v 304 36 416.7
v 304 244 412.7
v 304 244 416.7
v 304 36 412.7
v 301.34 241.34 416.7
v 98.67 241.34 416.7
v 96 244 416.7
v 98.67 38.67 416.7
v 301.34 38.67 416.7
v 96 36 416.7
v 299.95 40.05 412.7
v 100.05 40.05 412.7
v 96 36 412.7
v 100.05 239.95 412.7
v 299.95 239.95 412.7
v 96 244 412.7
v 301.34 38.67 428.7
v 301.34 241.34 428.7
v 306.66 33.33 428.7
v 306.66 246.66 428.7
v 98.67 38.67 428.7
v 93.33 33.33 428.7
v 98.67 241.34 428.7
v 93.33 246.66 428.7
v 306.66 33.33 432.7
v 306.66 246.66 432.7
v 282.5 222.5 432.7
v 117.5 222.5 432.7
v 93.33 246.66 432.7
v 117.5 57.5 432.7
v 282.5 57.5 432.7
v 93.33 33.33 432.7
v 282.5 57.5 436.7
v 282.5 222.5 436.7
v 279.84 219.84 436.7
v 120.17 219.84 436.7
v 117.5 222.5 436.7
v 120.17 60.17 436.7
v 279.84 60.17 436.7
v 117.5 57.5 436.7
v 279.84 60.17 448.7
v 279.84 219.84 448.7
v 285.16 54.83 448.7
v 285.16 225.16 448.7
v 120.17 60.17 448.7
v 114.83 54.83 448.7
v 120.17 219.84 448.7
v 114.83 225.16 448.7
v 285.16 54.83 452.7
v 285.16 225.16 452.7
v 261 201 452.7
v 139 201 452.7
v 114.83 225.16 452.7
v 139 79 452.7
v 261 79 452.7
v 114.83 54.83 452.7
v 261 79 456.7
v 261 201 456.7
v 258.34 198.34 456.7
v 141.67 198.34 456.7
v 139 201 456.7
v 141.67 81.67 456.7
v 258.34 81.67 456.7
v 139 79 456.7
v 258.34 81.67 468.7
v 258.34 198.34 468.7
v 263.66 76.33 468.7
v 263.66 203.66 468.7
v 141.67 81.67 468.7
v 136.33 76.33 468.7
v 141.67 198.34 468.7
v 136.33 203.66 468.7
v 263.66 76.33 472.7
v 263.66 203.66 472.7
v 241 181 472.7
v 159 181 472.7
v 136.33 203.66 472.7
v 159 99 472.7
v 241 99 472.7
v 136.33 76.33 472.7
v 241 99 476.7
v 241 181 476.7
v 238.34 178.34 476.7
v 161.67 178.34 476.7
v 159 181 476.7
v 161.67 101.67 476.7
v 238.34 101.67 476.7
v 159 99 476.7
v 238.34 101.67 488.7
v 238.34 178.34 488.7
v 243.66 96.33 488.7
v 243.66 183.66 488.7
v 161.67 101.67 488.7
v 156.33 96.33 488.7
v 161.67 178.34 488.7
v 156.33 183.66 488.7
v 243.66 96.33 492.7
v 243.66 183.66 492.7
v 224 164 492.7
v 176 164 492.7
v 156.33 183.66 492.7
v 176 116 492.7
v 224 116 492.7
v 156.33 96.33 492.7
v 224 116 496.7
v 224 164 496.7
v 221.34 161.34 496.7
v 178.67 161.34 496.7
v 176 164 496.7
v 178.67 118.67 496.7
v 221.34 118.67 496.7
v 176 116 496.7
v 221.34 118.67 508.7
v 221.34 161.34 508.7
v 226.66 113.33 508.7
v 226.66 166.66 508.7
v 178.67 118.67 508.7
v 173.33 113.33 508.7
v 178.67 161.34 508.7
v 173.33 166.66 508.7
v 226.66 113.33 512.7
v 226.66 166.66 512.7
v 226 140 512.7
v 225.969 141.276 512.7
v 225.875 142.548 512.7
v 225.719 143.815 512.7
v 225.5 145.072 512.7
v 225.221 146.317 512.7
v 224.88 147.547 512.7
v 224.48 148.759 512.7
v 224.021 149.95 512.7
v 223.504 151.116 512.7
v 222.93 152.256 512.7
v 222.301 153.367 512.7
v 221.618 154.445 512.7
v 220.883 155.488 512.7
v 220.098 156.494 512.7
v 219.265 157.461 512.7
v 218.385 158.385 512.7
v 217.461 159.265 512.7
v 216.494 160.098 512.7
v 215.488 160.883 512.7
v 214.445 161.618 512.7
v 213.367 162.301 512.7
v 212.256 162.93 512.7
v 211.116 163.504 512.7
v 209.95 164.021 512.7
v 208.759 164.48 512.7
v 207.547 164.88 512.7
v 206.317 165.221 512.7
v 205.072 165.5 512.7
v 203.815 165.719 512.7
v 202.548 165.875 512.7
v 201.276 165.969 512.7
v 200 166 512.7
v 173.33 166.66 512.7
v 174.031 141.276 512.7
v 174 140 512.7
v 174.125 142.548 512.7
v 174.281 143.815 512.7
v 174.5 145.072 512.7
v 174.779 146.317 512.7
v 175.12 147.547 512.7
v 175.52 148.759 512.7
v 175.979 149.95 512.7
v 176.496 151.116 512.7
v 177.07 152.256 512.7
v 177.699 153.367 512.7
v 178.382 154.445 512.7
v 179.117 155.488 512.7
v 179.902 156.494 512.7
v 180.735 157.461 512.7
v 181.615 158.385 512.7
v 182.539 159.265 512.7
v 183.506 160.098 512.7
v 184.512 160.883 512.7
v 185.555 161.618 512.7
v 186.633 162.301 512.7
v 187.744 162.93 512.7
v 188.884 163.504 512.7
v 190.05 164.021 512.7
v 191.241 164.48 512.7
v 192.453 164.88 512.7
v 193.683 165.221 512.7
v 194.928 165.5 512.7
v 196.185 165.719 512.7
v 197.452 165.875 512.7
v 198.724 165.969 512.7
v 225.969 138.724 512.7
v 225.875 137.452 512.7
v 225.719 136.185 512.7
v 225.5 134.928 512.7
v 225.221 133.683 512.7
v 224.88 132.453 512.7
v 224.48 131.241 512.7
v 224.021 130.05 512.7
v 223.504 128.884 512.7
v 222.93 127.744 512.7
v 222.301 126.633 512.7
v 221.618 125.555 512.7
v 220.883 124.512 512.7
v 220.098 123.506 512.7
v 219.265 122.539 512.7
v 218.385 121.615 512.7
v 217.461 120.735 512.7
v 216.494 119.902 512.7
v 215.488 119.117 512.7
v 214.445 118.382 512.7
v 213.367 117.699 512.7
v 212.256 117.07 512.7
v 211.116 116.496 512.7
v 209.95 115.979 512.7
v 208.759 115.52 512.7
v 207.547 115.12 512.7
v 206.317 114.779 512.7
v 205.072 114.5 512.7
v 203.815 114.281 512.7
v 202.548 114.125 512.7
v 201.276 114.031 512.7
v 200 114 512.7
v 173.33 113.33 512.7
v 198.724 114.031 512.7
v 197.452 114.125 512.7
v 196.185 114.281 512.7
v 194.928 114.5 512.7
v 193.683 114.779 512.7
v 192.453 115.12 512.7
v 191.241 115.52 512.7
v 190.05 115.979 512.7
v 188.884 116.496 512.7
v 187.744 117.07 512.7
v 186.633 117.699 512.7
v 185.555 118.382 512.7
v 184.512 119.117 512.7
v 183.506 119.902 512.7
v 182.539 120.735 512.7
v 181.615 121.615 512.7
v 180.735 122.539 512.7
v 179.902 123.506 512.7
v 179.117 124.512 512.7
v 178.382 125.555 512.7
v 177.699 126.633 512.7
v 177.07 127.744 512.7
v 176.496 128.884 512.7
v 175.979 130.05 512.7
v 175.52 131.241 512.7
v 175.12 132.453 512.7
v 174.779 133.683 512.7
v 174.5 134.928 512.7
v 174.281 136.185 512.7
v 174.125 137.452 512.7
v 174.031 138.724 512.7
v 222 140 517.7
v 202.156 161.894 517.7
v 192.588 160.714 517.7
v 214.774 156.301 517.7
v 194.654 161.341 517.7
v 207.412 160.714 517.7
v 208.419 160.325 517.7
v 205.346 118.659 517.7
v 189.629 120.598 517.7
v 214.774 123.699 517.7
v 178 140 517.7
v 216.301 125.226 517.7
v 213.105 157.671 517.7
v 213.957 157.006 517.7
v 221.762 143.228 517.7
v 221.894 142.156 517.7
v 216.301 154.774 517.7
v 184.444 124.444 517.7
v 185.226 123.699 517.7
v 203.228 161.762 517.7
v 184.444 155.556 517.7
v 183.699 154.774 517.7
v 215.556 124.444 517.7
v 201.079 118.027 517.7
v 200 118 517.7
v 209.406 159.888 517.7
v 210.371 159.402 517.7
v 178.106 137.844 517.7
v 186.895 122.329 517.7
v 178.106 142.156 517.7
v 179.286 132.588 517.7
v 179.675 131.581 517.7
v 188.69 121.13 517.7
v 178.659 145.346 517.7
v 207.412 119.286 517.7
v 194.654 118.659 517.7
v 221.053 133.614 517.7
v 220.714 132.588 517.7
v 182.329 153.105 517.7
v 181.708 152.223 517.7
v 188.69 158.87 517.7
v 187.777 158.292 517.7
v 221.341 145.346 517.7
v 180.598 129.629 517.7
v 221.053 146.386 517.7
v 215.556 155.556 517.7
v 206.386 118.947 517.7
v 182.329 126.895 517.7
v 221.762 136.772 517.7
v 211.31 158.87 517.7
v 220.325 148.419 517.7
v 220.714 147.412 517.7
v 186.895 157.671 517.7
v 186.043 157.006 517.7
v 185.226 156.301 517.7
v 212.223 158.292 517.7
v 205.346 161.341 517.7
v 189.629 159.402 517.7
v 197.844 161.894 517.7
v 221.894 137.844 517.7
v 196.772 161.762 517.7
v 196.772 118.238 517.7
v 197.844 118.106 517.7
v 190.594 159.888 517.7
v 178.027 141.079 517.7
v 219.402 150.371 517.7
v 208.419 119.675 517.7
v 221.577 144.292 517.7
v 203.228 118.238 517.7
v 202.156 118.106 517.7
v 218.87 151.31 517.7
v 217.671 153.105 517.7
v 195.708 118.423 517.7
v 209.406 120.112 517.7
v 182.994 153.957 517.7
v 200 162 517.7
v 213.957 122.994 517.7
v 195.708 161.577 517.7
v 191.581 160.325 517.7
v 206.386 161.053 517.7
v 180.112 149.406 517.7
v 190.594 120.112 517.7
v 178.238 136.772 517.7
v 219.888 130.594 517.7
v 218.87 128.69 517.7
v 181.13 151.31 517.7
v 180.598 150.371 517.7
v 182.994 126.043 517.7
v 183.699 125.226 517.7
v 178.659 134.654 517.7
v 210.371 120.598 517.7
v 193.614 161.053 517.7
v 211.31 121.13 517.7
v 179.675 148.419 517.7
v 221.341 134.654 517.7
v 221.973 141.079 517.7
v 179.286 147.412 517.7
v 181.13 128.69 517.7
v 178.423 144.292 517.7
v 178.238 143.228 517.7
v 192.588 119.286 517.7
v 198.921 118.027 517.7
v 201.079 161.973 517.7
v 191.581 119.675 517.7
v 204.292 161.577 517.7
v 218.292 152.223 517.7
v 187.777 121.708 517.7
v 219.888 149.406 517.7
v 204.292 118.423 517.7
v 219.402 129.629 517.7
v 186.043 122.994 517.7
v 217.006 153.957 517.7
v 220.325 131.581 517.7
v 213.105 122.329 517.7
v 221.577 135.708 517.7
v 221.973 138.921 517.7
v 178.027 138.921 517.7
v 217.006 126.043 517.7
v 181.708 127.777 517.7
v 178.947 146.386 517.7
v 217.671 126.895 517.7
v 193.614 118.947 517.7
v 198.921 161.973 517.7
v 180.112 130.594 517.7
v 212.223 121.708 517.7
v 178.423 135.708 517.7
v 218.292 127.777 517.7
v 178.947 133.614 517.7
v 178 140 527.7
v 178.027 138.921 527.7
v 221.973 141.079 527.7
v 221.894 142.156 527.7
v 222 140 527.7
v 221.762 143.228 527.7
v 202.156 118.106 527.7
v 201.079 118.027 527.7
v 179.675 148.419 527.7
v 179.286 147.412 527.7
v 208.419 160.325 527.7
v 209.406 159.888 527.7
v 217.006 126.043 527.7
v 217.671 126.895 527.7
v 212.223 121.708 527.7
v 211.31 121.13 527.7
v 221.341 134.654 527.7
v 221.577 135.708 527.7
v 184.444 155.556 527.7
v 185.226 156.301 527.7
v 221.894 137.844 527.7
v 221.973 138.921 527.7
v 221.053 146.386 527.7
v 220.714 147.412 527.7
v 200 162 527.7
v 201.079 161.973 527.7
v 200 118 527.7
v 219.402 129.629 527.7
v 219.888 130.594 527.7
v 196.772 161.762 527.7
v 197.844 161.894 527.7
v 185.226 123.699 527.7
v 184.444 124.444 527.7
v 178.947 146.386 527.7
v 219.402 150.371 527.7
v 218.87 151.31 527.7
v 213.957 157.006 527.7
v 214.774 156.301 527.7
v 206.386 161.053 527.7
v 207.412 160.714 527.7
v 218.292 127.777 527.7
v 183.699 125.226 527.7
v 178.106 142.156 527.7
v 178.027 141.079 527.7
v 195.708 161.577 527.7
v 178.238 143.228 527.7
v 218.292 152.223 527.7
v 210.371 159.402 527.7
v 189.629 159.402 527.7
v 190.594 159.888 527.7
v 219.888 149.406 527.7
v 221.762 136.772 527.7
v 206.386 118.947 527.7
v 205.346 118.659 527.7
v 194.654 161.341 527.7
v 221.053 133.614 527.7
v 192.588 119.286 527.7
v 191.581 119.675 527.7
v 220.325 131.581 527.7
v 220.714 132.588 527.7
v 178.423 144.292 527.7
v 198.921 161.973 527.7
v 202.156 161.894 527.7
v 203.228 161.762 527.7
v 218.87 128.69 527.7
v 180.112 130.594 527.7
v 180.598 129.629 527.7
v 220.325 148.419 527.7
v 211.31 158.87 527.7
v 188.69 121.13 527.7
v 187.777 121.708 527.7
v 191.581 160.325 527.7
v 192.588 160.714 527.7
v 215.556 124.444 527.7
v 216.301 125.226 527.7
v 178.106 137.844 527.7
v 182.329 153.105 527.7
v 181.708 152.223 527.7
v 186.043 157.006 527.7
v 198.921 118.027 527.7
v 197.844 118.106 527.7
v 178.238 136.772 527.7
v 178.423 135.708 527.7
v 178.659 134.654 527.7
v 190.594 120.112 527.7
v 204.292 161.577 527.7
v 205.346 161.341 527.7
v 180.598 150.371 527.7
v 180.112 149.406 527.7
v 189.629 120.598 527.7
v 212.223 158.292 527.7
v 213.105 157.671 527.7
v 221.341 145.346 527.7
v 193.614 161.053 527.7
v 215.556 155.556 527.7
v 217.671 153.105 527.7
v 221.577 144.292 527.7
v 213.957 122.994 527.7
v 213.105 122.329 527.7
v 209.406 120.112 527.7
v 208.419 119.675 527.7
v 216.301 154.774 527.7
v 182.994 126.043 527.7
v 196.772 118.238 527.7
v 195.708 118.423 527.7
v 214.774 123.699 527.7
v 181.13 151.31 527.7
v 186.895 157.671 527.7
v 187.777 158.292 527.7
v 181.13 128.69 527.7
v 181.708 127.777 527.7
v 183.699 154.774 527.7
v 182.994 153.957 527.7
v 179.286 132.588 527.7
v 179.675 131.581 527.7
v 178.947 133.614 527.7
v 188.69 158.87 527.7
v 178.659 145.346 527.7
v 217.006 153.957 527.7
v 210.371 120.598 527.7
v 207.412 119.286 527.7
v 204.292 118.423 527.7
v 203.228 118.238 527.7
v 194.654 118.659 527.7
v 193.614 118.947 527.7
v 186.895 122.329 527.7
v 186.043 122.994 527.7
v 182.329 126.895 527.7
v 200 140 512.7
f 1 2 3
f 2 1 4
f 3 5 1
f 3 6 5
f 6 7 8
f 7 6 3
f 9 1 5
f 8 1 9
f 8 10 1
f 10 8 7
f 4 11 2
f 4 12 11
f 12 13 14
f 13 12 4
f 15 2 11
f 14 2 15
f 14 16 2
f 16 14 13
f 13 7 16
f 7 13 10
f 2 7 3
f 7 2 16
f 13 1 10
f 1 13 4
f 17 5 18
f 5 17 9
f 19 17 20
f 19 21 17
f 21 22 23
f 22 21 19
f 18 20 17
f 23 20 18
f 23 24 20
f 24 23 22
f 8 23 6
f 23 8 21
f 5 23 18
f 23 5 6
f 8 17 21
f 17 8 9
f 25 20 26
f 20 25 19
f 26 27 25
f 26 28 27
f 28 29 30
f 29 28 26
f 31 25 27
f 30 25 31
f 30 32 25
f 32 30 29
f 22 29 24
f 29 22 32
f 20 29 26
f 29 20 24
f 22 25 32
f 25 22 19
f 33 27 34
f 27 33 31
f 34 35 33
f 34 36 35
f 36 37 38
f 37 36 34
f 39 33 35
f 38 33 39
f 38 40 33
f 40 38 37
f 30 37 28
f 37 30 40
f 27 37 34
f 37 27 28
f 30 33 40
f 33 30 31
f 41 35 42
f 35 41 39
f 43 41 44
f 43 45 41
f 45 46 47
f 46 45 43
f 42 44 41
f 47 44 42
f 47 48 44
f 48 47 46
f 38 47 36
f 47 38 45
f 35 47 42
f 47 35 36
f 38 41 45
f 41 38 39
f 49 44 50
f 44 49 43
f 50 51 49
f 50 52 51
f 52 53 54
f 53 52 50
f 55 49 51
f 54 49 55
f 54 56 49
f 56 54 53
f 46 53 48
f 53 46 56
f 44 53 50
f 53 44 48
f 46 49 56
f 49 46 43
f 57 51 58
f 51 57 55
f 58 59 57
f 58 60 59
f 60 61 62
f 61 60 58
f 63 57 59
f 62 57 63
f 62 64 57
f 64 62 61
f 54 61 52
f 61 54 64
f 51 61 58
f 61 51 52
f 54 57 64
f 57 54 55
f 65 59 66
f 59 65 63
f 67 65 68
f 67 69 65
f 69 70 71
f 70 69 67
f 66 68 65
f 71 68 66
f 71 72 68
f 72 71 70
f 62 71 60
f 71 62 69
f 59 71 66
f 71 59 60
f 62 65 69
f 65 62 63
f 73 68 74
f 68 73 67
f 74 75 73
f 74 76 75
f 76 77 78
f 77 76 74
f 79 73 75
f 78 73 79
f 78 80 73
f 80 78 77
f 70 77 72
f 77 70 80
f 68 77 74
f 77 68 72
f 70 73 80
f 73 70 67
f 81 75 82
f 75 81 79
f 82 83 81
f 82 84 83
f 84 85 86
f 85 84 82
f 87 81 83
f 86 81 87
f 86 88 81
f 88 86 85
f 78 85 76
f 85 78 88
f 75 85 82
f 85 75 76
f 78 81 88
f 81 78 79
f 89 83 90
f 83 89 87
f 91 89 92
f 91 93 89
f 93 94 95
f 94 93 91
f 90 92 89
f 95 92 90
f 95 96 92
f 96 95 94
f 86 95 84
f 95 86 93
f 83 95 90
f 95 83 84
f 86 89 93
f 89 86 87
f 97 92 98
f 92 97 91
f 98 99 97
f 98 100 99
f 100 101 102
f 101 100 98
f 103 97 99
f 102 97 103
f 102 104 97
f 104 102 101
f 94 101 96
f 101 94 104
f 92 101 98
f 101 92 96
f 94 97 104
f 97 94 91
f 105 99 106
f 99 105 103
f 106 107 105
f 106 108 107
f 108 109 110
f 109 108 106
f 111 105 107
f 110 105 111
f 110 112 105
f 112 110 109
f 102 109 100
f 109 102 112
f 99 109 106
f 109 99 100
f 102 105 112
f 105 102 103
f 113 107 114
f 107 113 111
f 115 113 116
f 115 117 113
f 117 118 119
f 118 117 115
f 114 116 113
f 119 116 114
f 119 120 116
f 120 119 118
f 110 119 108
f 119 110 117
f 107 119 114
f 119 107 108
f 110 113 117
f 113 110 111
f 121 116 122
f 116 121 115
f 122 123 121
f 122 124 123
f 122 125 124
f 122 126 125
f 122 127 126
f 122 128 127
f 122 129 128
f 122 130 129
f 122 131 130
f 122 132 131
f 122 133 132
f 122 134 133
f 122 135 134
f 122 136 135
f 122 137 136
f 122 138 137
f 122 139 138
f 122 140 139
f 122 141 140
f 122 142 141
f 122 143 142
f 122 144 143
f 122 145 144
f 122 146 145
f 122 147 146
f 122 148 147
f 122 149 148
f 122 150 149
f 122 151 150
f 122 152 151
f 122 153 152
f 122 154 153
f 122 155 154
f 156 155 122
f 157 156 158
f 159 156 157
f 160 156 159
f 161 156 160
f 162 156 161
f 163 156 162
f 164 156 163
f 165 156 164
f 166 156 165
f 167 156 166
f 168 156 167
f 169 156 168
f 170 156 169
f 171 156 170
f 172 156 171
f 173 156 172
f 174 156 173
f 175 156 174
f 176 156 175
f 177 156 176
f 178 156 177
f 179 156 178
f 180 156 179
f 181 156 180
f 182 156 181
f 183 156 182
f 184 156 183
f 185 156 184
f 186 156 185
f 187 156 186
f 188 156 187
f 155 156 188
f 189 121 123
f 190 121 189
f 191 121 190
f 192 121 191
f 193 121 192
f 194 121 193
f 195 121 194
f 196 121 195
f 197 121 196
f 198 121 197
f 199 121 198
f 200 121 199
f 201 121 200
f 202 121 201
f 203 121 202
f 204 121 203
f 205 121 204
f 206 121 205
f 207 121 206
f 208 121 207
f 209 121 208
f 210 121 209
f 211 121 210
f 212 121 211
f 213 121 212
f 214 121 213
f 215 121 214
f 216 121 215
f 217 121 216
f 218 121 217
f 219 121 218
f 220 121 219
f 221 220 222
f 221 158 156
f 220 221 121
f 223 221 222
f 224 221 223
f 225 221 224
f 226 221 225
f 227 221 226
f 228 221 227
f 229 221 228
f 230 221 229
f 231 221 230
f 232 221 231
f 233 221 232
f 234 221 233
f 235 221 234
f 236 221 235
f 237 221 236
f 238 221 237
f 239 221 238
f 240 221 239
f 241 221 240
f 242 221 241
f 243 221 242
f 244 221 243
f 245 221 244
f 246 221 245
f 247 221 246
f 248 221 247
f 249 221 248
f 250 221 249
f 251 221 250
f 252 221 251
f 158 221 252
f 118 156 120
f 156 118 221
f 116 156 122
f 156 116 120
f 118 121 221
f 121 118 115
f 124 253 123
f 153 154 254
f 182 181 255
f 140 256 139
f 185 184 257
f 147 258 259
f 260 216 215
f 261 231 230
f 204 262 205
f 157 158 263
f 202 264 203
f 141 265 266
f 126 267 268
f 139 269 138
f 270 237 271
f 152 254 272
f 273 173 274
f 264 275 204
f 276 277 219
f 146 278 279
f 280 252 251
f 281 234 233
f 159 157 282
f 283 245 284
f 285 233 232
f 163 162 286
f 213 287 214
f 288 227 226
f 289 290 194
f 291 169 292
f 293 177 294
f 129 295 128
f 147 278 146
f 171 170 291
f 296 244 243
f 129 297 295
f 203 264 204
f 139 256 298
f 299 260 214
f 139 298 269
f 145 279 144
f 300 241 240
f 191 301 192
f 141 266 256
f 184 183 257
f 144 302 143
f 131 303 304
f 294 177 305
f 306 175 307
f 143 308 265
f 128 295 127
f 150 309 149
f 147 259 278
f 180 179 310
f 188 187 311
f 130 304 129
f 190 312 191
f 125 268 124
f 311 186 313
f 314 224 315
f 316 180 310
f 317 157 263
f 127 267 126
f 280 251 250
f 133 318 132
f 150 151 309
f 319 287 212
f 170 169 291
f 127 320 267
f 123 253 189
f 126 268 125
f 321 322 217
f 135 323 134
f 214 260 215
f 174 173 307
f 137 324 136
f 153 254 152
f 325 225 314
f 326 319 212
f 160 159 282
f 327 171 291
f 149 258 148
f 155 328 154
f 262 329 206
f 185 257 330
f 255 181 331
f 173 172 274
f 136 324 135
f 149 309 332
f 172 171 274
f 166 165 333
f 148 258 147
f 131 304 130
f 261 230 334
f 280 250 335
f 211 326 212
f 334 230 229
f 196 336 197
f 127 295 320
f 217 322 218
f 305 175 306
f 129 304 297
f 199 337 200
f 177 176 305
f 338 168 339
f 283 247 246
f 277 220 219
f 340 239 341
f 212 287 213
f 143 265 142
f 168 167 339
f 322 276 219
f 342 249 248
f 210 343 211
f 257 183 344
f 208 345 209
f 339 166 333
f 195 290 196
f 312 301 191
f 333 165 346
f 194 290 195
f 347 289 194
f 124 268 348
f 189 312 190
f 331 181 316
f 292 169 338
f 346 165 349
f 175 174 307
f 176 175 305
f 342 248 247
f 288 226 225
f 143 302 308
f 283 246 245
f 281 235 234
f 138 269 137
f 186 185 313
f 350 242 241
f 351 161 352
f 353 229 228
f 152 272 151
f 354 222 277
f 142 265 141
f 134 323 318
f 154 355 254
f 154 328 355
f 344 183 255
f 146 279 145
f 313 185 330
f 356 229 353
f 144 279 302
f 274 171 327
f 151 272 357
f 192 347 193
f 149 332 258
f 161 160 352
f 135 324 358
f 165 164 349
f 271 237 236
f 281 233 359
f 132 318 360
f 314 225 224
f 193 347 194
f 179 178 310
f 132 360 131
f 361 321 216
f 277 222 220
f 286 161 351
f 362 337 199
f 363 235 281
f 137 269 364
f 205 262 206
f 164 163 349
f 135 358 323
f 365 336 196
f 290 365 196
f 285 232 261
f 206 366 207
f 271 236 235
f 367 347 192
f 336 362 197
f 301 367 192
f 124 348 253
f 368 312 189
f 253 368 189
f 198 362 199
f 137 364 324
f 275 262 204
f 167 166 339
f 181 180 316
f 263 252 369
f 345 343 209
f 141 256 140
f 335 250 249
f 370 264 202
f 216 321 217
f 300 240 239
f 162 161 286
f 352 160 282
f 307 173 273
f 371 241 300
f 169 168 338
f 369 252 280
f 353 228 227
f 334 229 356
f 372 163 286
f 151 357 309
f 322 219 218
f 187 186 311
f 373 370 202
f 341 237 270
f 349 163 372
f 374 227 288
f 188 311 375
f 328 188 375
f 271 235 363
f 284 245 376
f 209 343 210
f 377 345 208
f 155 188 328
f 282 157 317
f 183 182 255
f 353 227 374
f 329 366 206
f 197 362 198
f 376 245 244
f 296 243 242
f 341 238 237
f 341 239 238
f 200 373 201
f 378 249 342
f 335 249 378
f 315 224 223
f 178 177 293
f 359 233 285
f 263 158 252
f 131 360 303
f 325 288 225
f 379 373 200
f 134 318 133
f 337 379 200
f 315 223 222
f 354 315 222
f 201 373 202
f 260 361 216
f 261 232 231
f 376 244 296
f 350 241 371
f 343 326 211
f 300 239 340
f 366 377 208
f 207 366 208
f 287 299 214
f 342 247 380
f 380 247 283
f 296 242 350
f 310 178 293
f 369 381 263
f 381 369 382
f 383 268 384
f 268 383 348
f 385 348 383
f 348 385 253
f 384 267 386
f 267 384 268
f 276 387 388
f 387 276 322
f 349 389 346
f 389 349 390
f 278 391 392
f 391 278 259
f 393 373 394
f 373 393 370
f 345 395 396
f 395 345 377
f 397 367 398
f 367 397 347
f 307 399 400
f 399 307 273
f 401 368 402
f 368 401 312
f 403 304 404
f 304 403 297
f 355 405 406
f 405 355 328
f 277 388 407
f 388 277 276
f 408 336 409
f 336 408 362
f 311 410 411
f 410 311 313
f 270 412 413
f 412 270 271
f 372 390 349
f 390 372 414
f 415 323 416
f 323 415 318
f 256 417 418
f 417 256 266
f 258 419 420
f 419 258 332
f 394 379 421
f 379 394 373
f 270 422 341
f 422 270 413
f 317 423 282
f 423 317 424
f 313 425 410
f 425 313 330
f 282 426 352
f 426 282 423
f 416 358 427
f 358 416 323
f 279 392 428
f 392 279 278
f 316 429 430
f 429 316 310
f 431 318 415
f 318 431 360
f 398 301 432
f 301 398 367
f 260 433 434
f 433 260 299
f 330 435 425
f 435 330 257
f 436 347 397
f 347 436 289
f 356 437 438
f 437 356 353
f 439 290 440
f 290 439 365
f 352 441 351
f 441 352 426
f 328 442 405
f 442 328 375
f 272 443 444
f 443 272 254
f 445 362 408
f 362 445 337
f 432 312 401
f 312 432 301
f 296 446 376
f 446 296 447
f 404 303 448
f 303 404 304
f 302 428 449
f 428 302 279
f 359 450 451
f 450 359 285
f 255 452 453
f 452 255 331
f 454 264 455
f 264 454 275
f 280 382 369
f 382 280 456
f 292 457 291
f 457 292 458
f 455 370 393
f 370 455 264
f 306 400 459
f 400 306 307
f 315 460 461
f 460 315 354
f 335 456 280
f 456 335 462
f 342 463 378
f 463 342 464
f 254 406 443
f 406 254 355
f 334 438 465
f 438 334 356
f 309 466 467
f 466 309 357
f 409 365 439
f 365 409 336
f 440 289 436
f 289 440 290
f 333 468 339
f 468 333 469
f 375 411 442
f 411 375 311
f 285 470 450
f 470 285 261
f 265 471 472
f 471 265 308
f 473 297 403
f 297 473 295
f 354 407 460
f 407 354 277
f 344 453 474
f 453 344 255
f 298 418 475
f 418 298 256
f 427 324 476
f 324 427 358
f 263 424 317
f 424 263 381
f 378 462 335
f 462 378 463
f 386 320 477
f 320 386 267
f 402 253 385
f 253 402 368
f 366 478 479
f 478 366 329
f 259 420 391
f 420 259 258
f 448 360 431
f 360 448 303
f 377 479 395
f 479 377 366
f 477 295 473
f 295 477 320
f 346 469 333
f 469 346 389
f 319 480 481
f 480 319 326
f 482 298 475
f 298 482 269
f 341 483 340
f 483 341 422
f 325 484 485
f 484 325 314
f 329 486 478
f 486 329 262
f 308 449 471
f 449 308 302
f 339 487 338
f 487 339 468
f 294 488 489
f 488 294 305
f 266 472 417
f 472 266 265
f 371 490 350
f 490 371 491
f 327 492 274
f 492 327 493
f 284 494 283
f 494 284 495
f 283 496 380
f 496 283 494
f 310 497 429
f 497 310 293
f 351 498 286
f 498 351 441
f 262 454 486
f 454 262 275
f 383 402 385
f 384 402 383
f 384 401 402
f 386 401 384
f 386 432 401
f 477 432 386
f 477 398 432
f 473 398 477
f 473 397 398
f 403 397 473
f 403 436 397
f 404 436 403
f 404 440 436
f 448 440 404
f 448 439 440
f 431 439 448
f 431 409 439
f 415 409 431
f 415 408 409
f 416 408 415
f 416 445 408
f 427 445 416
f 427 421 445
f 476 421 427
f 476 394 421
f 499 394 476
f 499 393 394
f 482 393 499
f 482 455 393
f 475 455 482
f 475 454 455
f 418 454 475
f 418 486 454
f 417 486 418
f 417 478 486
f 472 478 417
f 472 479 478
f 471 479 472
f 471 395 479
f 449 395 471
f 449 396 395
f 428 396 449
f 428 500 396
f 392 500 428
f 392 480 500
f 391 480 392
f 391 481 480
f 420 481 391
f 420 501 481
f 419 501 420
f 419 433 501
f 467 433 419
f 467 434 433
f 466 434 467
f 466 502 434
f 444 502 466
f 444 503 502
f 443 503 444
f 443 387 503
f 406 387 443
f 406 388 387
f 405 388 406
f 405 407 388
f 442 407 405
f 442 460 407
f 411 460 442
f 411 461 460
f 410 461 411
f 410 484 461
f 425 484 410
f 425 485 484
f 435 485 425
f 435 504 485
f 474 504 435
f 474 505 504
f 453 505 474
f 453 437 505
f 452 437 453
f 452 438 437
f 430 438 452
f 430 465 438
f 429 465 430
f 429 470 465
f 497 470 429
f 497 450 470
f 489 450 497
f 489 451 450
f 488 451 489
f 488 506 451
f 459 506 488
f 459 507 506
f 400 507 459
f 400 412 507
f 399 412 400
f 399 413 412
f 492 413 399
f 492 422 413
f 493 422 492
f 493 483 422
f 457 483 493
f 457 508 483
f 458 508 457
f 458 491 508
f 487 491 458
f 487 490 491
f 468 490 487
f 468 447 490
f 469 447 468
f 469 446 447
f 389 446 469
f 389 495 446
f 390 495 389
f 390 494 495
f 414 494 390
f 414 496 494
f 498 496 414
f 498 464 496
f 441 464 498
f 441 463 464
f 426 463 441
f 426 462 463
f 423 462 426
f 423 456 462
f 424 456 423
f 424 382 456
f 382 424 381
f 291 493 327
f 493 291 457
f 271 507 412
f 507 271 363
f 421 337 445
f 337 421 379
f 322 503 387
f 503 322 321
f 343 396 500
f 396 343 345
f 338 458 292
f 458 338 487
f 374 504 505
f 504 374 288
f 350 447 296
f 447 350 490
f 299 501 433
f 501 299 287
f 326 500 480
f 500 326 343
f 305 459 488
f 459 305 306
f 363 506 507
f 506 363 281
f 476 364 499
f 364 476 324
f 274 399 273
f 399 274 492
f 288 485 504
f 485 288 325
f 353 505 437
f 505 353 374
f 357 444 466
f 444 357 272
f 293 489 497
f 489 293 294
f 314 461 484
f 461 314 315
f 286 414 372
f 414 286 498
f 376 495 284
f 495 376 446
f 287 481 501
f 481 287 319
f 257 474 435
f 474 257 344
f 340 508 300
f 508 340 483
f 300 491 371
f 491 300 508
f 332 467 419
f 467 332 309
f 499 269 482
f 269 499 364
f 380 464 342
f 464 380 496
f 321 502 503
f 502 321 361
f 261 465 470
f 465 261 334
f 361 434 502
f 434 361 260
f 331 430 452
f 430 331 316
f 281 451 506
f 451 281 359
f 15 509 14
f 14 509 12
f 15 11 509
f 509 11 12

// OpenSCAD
// file: turned_kalasa_module.scad
// ---------- Turned Kalasa Finial Module ----------

module turned_kalasa(h = 60,fn=180) {
    scale_factor = h / 45;
    scale([scale_factor, scale_factor, scale_factor])
    rotate_extrude($fn = fn) {
        cove_pts  = [ for (a = [0 : 6 : 90]) [ 7.5 + 5.5 * cos(a), 2.0 + 3.0 * sin(a) ] ];
        belly_pts = [ for (a = [0 : 3 : 180]) [ 7.5 + 7.0 * sin(a), 5.0 + 17.0 * (a / 180) ] ];
        neck_pts  = [ for (a = [0 : 6 : 90]) [ 6.0 + 1.5 * cos(a), 22.0 + 2.0 * sin(a) ] ];
        ring_pts  = [ for (a = [0 : 6 : 180]) [ 6.0 + 4.5 * sin(a) - 1.5 * (a / 180), 24.0 + 7.0 * (a / 180) ] ];
        spire_pts = [ for (i = [0 : 15]) let(t = i / 15) [ 1.5 + 3.0 * pow(1 - t, 1.3), 31.0 + 12.5 * t ] ];
        tip_pts   = [ for (a = [0 : 10 : 90]) [ 1.5 * cos(a), 43.5 + 1.5 * sin(a) ] ];

        profile = concat(
            [[0, 0], [13.0, 0], [13.0, 2.0]],
            cove_pts,
            belly_pts,
            neck_pts,
            ring_pts,
            spire_pts,
            tip_pts,
            [[0, 45]]
        );
        
        polygon(profile);
    }
}
// file: parameters.scad
$fn = 128; // Resolution for rounded extrusions
eps = 0.05;

// ---------- Hardware & Material Parameters (Fixed Physical Hardware) ----------
wood_t        = 6.35;    // 1/4 inch wood plate thickness
cardboard_t   = 3.00;    // Standard single-wall corrugated cardboard thickness
pvc_od        = 21.34;   // 1/2" Schedule 40 PVC Pipe outer diameter
sleeve_id     = 22.20;   // Inner bore for 3D printed sleeves
r_inner       = sleeve_id / 2; // 11.1mm inner radius bore

// ---------- Sleeve Shell Thickness ----------
sleeve_wall_t = 1.2;    // Uniform hollow shell wall thickness (mm) to minimize weight

// ---------- Flange Clearance Parameters ----------
flange_bottom_h = 5.0;  // Clearance reserved at bottom for wide flat flange region (mm)
flange_top_h    = 5.0;  // Clearance reserved at top for upper mounting flange (mm)

// ---------- Main Structure Dimensions ----------
base_w = 400;             
base_d = 280;            

wall_h = 400;            
beam_h = 60;              
arch_r = 50.67;           

roof_overhang = 20;       

diya_proj_depth = 80;     
diya_proj_w     = 160;    
diya_seat_r     = 26.67;  

// ---------- Derived Coordinates & Heights ----------
deck_top   = wood_t;
pillar_top = deck_top + wall_h;
roof_bot   = pillar_top;
roof_top   = roof_bot + wood_t;

// Sleeve Height adjusted to clear top and bottom flanges
sleeve_h   = wall_h - flange_bottom_h - flange_top_h;

// Pillar Rod Center Offsets from Origin
pillar_x1 = 37.33;        
pillar_x2 = base_w - 37.33;
pillar_y1 = 37.33;        
pillar_y2 = base_d - 37.33;


//Shikara
tier_h = 20;
            num_tiers = 5;
tier_dims = [
                [208.00, 208.00], 
                [165.00, 165.00], 
                [122.00, 122.00], 
                [82.00,  82.00],  
                [48.00,  48.00]   
            ];
// file: printed_shikhara_module.scad
// ---------- 220x220x220 mm Bounded Shikhara (Phamsana Pyramid) ----------
include<turned_kalasa_module.scad>
module printed_shikhara_hollow(base_w,base_d,roof_top,includeKalasha=true) {
    shikhara_h    = num_tiers * tier_h;              // Total height of stacked tiers
    bottom_tier_w = tier_dims[0][0];                 // Footprint width of bottom-most tier
    wall_margin   = 4.0;                             // Minimum rim/wall thickness at base

    // ---------- 45-Degree Self-Supporting Geometry Derivations ----------
    // For a 45-degree angle, rise = run, meaning Height = Base_Width / 2
    cut_base_w    = bottom_tier_w - (2 * wall_margin); 
    cut_h         = cut_base_w / 2;                  

    // OpenSCAD cylinder $fn=4$ radius calculation:
    // An axis-aligned square of width W rotated 45° has a vertex radius r = (W / 2) * sqrt(2)
    cut_r1        = (cut_base_w / 2) * sqrt(2);

    // ---------- Hollowed Assembly ----------
    difference() {
        
        printed_shikhara_solid(base_w, base_d, roof_top,includeKalasha);
        
        // Subtraction cutout centered at base of Shikhara
        translate([base_w / 2, base_d / 2, roof_top - eps])
            rotate([0, 0, 45])
                cylinder(
                    h      = cut_h + eps, 
                    r1     = cut_r1, 
                    r2     = 0, 
                    $fn    = 4, 
                    center = false
                ); 
    }
}

module printed_shikhara_solid(base_w,base_d,roof_top,includeKalasha=true) {
    color([0.95, 0.82, 0.45]) {
        cx = base_w / 2;
        cy = base_d / 2;

        translate([cx, cy, roof_top]) {
            
            

            for (i = [0 : num_tiers - 1]) {
                tw = tier_dims[i][0];
                td = tier_dims[i][1];
                tz = i * tier_h;

                translate([-tw/2, -td/2, tz]) {
                    cube([tw, td, 4]);
                    translate([2.67, 2.67, 4])
                        cube([tw - 5.33, td - 5.33, tier_h - 8]);
                    translate([-2.67, -2.67, tier_h - 4])
                        cube([tw + 5.33, td + 5.33, 4]);
                }

                if (includeKalasha &&(i == 1 || i == 2)) {
                    tx_corner = tw / 2 - 8;
                    ty_corner = td / 2 - 8;
                    for (mx = [-tx_corner, tx_corner]) {
                        for (my = [-ty_corner, ty_corner]) {
                            translate([mx, my, tz + tier_h])
                                turned_kalasa(h = 28,fn=64); 
                        }
                    }
                }
                
            }

            top_z = num_tiers * tier_h; // 100mm
            translate([0, 0, top_z]) {
                cylinder(h = 5.00, r1 = 26.00, r2 = 22.00);
                translate([0, 0, 5.00])
                    cylinder(h = 10.00, r = 22.00, $fn = 128);
                if (includeKalasha)
                translate([0, 0, 15.00])
                    turned_kalasa(h = 60.00,fn=64); // Top spire finial
            }
                        

        }
    }
}
// main file
// Carves out a self-supporting 45-degree hollow pyramid from beneath
include<printed_shikhara_module.scad>
include<parameters.scad>

printed_shikhara_hollow(base_w,base_d,roof_top,includeKalasha=false);
